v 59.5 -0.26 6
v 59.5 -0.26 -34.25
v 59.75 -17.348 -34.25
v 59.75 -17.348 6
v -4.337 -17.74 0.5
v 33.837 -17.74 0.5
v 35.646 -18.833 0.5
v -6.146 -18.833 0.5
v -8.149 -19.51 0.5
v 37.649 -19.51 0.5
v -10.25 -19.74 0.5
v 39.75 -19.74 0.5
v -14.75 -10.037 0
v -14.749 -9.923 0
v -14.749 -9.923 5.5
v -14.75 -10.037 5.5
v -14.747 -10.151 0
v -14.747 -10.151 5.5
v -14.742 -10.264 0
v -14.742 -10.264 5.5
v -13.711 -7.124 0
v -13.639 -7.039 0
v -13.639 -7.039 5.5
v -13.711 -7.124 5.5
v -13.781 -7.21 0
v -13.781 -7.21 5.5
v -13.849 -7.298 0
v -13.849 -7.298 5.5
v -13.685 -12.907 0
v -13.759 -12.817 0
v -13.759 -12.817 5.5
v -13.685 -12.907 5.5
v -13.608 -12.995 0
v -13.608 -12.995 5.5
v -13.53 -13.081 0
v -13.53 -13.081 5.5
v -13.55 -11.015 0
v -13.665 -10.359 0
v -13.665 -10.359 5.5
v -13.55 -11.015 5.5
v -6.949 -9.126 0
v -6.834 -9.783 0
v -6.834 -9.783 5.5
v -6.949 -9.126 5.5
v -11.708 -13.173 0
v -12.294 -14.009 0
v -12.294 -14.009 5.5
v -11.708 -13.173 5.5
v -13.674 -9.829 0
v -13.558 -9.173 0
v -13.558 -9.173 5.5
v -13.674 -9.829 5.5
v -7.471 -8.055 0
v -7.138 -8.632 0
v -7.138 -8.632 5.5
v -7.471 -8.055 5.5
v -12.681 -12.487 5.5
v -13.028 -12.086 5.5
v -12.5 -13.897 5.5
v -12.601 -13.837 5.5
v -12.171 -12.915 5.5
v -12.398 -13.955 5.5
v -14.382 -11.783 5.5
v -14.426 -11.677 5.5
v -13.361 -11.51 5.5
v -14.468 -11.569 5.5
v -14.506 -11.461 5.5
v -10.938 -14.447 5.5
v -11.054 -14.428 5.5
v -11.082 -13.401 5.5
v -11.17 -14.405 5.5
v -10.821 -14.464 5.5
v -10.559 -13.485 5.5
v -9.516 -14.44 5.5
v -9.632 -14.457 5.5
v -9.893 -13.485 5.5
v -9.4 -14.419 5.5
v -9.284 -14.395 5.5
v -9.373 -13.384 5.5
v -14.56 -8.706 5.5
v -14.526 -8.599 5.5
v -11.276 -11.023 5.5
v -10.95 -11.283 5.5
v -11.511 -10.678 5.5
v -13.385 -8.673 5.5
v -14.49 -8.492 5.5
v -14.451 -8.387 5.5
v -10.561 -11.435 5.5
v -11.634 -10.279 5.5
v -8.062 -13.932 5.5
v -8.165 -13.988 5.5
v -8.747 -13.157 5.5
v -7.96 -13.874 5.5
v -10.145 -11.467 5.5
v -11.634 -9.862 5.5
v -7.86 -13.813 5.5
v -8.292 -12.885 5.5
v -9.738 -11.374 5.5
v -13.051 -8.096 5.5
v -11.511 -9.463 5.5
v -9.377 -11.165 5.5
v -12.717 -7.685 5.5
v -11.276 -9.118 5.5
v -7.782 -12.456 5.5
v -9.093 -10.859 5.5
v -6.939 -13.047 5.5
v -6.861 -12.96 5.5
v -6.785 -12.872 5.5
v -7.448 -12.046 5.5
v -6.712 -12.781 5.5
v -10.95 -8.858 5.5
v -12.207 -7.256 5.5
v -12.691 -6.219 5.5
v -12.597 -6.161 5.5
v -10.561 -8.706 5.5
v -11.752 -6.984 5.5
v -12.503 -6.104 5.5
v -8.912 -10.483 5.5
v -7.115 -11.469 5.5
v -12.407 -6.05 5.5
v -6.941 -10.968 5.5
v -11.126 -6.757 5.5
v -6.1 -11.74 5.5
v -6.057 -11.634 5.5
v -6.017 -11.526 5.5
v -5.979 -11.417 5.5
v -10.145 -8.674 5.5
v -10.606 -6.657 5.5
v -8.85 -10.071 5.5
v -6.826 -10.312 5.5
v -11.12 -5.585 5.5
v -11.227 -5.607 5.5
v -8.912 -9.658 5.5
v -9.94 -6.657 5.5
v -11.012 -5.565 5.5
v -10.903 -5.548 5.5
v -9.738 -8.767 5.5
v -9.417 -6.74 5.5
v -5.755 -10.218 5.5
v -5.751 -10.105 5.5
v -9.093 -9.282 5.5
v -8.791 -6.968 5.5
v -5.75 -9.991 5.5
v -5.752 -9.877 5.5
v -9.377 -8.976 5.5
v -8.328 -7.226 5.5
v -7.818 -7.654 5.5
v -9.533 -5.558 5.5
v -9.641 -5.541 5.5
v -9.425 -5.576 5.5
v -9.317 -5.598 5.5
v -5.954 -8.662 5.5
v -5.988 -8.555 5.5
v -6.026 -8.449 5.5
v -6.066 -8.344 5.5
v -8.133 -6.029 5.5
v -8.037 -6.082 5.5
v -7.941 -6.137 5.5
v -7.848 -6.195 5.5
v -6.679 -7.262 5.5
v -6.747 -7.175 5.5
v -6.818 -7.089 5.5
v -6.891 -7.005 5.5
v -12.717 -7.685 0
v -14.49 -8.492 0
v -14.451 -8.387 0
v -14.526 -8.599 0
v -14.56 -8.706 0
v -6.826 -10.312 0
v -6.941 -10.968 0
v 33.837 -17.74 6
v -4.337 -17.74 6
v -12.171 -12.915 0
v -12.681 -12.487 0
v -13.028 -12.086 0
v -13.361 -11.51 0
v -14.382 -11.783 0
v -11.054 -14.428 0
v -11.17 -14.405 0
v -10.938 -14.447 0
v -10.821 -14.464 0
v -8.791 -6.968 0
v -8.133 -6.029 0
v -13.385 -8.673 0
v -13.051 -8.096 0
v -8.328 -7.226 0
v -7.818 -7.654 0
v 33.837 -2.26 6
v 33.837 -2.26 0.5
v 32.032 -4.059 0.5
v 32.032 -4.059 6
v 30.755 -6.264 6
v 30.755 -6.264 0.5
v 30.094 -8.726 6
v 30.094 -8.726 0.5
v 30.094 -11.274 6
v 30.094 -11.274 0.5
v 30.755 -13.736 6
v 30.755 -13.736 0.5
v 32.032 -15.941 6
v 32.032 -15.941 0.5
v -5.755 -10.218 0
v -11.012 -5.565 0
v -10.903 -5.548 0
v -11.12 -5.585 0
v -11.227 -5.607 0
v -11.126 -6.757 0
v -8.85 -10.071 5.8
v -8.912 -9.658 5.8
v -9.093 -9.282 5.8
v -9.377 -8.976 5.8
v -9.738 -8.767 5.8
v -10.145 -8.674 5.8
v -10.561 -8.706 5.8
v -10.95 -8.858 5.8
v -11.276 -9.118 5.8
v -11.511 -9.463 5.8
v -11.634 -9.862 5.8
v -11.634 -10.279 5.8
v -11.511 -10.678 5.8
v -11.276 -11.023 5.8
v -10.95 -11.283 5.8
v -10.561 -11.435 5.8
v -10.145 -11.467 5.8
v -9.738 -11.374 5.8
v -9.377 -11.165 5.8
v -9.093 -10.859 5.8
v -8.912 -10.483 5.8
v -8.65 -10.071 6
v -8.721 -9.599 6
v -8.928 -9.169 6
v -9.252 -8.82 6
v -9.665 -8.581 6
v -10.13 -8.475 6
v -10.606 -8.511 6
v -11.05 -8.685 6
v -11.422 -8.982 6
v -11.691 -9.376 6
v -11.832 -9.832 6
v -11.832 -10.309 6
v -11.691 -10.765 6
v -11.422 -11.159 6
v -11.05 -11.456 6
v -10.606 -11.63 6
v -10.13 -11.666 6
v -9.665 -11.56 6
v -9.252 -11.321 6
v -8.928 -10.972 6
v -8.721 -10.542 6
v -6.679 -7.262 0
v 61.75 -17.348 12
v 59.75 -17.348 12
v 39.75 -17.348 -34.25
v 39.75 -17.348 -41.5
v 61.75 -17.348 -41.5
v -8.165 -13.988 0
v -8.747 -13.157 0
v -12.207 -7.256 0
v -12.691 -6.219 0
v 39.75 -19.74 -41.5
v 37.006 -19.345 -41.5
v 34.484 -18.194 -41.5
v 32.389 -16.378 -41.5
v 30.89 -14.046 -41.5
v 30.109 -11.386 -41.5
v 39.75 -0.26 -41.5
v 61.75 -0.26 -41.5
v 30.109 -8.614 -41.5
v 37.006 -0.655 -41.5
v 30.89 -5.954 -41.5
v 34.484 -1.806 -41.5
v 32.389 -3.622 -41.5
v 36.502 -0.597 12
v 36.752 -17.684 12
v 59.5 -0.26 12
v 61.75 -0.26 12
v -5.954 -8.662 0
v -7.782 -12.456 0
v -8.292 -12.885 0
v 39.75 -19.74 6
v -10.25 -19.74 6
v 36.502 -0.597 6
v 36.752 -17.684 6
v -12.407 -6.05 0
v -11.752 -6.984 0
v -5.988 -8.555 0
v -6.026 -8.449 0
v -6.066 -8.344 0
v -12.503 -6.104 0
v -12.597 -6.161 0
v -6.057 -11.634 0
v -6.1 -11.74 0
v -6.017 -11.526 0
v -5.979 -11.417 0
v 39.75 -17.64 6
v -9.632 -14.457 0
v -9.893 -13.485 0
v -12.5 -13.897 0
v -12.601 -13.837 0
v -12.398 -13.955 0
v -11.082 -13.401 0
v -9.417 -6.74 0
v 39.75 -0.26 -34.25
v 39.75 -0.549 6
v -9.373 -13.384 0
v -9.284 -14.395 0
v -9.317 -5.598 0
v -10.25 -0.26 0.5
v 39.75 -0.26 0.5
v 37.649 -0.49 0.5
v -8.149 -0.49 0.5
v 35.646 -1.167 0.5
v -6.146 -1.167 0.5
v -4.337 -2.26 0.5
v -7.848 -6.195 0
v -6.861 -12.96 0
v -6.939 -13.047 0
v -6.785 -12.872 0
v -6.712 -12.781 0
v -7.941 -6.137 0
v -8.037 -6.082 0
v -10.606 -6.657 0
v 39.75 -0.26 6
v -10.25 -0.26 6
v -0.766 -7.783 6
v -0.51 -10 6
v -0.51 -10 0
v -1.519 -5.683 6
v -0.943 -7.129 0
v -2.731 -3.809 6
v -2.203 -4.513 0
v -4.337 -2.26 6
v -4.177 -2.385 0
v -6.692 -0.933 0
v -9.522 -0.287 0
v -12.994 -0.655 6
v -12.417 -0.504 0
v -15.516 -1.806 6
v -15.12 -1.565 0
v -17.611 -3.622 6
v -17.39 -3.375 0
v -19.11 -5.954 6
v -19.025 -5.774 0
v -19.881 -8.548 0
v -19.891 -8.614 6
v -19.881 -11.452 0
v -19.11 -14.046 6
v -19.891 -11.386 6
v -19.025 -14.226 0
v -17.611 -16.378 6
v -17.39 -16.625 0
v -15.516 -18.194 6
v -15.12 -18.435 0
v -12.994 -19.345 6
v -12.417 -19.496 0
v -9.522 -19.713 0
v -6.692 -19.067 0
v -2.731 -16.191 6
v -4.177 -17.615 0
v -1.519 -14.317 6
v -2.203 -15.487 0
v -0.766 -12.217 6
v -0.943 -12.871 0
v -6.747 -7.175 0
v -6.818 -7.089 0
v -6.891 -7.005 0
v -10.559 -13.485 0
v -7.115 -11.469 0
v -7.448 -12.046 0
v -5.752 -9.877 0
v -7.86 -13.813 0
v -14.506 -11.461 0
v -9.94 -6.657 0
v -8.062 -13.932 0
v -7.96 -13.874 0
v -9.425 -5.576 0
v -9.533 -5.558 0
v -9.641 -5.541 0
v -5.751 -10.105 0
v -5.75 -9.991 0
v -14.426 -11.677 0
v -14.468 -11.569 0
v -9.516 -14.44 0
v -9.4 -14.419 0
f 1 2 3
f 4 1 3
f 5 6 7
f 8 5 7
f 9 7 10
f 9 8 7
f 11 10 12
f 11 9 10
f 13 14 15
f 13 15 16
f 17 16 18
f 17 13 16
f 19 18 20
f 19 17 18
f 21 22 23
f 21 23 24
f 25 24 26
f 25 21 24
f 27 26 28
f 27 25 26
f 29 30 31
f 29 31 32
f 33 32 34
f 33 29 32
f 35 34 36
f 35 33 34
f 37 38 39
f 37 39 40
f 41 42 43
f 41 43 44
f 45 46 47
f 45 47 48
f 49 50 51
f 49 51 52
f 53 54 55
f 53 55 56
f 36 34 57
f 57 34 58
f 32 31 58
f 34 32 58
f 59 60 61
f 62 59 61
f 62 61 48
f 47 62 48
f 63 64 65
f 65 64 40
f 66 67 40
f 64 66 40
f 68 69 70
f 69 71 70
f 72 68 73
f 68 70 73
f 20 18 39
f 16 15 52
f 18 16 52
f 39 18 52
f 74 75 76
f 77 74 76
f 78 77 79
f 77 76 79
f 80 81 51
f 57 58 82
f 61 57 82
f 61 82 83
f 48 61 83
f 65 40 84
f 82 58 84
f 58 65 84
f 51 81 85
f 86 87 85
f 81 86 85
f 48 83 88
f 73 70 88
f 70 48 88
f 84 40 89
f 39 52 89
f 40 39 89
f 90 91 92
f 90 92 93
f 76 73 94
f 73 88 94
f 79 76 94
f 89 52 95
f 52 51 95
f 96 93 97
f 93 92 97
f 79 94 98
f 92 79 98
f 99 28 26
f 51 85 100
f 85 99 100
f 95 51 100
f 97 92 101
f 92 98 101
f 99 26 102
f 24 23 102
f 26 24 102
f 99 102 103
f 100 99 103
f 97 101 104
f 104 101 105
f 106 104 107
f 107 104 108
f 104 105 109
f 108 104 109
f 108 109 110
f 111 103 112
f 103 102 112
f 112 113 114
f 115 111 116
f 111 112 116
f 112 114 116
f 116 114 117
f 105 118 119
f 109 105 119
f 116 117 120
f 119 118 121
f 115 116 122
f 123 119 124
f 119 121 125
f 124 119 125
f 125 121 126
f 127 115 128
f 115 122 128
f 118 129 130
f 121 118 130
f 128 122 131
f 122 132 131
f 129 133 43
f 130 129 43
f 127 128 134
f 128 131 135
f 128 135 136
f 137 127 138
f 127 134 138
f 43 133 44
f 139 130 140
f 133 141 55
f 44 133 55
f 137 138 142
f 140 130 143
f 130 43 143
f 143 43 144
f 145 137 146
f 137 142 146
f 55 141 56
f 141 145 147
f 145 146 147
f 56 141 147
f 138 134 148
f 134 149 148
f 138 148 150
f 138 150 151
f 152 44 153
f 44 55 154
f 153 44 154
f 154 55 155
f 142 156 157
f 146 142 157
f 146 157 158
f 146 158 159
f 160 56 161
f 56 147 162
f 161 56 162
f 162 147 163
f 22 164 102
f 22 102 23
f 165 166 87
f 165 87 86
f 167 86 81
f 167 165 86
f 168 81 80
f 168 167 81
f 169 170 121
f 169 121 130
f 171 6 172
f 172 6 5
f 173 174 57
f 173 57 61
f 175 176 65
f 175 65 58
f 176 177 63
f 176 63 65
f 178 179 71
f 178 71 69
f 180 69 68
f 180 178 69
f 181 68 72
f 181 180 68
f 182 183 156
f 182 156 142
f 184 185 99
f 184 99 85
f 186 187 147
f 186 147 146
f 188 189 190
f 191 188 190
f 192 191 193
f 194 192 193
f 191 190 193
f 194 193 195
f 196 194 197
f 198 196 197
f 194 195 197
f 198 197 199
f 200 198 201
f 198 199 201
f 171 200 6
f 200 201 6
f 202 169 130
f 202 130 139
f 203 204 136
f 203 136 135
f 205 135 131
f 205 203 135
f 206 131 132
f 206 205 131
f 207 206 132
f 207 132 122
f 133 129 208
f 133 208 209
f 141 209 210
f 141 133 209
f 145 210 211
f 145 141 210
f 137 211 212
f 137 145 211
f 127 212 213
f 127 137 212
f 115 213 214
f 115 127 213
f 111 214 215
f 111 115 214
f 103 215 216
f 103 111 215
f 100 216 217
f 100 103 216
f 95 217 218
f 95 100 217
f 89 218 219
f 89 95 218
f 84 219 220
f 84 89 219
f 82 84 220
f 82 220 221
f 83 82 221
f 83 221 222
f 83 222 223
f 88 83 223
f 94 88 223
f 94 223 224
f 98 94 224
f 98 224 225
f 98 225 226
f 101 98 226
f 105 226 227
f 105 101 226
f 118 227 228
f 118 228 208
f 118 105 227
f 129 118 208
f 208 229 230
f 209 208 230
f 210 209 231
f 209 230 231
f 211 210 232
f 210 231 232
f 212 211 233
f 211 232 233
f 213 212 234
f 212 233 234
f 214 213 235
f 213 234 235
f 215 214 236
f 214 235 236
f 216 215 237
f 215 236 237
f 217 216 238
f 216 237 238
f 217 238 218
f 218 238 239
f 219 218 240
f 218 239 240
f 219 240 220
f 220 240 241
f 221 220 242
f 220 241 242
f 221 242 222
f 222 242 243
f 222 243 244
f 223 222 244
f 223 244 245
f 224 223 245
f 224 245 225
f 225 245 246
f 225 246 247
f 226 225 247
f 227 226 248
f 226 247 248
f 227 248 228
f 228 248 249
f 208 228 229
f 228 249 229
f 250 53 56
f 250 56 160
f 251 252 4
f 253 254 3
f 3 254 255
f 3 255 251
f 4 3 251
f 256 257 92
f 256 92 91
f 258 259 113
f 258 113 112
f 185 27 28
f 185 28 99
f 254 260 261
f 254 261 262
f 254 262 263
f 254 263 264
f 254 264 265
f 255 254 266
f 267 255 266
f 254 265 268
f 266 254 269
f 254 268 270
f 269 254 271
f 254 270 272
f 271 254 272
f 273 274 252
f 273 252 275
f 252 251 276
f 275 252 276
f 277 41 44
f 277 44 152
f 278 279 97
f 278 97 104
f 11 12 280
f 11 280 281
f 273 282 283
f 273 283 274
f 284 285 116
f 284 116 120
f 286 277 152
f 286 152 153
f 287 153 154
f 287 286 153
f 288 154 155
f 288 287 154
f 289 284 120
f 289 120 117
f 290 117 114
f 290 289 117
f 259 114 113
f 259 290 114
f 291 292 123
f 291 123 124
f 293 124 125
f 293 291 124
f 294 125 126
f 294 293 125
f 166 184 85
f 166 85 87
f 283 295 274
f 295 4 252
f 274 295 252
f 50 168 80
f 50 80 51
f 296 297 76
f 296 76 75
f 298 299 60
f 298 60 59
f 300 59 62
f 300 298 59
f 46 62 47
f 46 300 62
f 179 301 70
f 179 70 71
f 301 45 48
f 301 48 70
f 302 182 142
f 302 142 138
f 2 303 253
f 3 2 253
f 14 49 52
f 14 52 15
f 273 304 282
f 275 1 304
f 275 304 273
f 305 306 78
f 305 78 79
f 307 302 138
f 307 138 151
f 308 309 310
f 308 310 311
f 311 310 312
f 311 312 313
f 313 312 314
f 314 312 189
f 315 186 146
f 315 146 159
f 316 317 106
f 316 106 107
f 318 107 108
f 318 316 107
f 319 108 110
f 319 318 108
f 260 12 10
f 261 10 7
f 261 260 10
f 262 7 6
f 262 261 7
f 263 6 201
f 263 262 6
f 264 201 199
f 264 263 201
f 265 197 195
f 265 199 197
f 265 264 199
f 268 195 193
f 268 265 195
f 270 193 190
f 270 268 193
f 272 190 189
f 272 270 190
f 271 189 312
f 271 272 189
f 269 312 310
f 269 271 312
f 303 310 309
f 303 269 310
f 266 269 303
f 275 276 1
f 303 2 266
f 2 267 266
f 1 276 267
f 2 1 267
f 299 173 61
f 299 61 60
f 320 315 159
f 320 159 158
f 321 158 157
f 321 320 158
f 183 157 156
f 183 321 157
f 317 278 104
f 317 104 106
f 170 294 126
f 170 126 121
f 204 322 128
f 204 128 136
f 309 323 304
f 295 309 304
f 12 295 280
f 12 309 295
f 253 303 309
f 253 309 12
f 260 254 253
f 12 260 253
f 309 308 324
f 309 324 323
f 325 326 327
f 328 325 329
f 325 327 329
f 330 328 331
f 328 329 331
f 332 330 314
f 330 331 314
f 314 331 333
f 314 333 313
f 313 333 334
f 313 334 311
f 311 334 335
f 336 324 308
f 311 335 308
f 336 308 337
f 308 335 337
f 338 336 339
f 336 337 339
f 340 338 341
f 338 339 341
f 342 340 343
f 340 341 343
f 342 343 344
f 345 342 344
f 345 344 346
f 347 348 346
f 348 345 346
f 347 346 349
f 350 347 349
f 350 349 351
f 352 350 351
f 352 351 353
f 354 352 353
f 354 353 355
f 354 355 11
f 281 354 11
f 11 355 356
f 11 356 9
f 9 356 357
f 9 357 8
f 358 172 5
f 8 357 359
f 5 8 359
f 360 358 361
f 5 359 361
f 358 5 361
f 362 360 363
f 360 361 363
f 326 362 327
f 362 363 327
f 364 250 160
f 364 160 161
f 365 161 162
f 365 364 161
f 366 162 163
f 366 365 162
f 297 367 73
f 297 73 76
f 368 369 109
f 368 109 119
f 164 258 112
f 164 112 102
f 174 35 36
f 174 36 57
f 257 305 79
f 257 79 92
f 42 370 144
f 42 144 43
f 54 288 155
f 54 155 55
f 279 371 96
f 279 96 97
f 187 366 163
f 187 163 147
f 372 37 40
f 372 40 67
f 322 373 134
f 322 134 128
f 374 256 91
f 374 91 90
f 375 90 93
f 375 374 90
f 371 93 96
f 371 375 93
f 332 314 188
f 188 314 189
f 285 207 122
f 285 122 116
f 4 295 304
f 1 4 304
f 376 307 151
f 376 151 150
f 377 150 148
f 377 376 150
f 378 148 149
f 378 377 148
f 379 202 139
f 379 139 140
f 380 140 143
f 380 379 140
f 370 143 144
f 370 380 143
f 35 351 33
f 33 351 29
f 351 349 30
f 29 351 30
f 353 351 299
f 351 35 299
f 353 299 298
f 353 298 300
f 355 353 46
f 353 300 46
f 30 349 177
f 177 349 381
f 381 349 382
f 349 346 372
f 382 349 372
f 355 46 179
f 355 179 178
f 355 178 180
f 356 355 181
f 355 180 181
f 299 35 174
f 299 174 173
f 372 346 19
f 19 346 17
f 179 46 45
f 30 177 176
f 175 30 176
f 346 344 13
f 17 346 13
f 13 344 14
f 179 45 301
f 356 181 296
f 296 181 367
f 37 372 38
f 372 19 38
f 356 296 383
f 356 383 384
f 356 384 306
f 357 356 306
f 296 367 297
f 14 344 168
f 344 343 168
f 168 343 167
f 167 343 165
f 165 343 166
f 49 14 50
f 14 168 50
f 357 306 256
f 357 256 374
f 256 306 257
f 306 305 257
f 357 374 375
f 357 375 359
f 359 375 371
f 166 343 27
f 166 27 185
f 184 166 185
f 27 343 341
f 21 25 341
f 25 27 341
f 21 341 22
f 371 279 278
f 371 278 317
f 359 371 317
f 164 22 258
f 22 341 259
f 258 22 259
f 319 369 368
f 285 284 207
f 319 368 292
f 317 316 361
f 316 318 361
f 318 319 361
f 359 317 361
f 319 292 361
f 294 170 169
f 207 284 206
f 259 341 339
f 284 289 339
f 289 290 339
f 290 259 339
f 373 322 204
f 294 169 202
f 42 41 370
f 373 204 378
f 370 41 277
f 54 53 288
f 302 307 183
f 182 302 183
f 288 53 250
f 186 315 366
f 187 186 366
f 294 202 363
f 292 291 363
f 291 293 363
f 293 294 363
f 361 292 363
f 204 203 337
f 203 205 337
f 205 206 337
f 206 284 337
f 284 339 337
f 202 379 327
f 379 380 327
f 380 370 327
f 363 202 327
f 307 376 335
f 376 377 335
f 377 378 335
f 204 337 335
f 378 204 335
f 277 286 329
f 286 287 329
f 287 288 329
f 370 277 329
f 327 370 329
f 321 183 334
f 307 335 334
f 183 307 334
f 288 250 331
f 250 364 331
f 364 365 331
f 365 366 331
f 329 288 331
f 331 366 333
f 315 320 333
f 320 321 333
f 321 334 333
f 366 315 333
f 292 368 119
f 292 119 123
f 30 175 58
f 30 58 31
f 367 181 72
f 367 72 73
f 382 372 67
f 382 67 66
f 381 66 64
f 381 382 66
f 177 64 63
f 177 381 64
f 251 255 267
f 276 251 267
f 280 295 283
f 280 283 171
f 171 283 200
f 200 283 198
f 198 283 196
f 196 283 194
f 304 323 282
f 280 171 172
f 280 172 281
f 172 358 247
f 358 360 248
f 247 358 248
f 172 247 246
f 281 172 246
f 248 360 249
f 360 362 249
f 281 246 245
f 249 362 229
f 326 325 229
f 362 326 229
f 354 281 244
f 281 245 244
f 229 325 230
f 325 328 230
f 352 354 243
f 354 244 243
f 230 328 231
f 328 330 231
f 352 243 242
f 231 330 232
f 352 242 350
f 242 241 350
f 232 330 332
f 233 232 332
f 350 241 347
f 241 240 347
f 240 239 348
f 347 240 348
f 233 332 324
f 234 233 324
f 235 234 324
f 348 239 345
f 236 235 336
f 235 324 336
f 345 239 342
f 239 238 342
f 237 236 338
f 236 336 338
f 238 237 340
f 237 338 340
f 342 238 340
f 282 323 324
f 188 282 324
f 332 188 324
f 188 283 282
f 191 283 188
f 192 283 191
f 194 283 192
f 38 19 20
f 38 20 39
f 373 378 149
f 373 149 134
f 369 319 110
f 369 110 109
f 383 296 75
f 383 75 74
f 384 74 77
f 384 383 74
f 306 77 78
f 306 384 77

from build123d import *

# Parameters (mm, degrees)
ESQUISSE1_R        = 9.739786638
BOSS_EXTRU_1_DEPTH = 5.5
ESQUISSE2_R        = 9.739786638
ESQUISSE2_R_2      = 1.4
BOSS_EXTRU_2_DEPTH = 0.5
CHANFREIN1_SIZE    = 0.2
BOSS_EXTRU_3_START = -5.5
BOSS_EXTRU_3_DEPTH = 5.5
BOSS_EXTRU_4_START = 42
BOSS_EXTRU_4_DEPTH = 42
BOSS_EXTRU_5_DEPTH = 22
BOSS_EXTRU_6_DEPTH = 46.25
ESQUISSE7_W        = 6
ESQUISSE7_H        = 17.089185867
BOSS_EXTRU_7_DEPTH = 23


with BuildPart() as part:
    # Esquisse1 → Boss.-Extru.1 (new body)
    with BuildSketch(Plane.XY):
        with Locations((-10.25, -10)):
            Circle(ESQUISSE1_R)
        with BuildLine():
            Line((-5.751675839, -9.877200395), (-6.833750507, -9.782531128))
            Line((-6.833750507, -9.782531128), (-6.949445107, -9.126394451))
            Line((-6.949445107, -9.126394451), (-5.953521963, -8.661987862))
            ThreePointArc((-5.953521963, -8.661987862), (-6.006634107, -8.502052772), (-6.065697468, -8.344218516))
            Line((-6.065697468, -8.344218516), (-7.138261768, -8.631611254))
            Line((-7.138261768, -8.631611254), (-7.47139109, -8.054614344))
            Line((-7.47139109, -8.054614344), (-6.678798898, -7.262022153))
            ThreePointArc((-6.678798898, -7.262022153), (-6.782621037, -7.131675902), (-6.891198054, -7.005263035))
            Line((-6.891198054, -7.005263035), (-7.818046533, -7.654249327))
            Line((-7.818046533, -7.654249327), (-8.328430264, -7.225986526))
            Line((-8.328430264, -7.225986526), (-7.847635402, -6.194918616))
            ThreePointArc((-7.847635402, -6.194918616), (-7.988951343, -6.109285545), (-8.133315872, -6.028898352))
            Line((-8.133315872, -6.028898352), (-8.791112727, -6.968329619))
            Line((-8.791112727, -6.968329619), (-9.417191057, -6.740455742))
            Line((-9.417191057, -6.740455742), (-9.317216173, -5.597737589))
            ThreePointArc((-9.317216173, -5.597737589), (-9.478728542, -5.566588183), (-9.641271425, -5.541362369))
            Line((-9.641271425, -5.541362369), (-9.940094206, -6.656584169))
            Line((-9.940094206, -6.656584169), (-10.606352849, -6.656584169))
            Line((-10.606352849, -6.656584169), (-10.903477232, -5.547700874))
            ThreePointArc((-10.903477232, -5.547700874), (-11.065761738, -5.574558464), (-11.226956242, -5.607329229))
            Line((-11.226956242, -5.607329229), (-11.126406846, -6.756614081))
            Line((-11.126406846, -6.756614081), (-11.752485176, -6.984487958))
            Line((-11.752485176, -6.984487958), (-12.406540122, -6.050400691))
            ThreePointArc((-12.406540122, -6.050400691), (-12.550096477, -6.132241451), (-12.690551241, -6.219297732))
            Line((-12.690551241, -6.219297732), (-12.206963835, -7.256354271))
            Line((-12.206963835, -7.256354271), (-12.717347566, -7.684617071))
            Line((-12.717347566, -7.684617071), (-13.638885709, -7.039349117))
            ThreePointArc((-13.638885709, -7.039349117), (-13.74618945, -7.166864047), (-13.848697947, -7.298264801))
            Line((-13.848697947, -7.298264801), (-13.051434053, -8.095528695))
            Line((-13.051434053, -8.095528695), (-13.384563375, -8.672525605))
            Line((-13.384563375, -8.672525605), (-14.450903238, -8.3868007))
            ThreePointArc((-14.450903238, -8.3868007), (-14.508366703, -8.545244687), (-14.559856563, -8.705729393))
            Line((-14.559856563, -8.705729393), (-13.557961929, -9.172920534))
            Line((-13.557961929, -9.172920534), (-13.673656528, -9.829057211))
            Line((-13.673656528, -9.829057211), (-14.74934404, -9.923167674))
            ThreePointArc((-14.74934404, -9.923167674), (-14.749021481, -10.093838761), (-14.74222728, -10.264374865))
            Line((-14.74222728, -10.264374865), (-13.665452724, -10.358580432))
            Line((-13.665452724, -10.358580432), (-13.549758125, -11.014717109))
            Line((-13.549758125, -11.014717109), (-14.506309194, -11.460764198))
            ThreePointArc((-14.506309194, -11.460764198), (-14.447094307, -11.623083293), (-14.381691786, -11.78300953))
            Line((-14.381691786, -11.78300953), (-13.360941463, -11.509500306))
            Line((-13.360941463, -11.509500306), (-13.027812142, -12.086497216))
            Line((-13.027812142, -12.086497216), (-13.758807936, -12.817493011))
            ThreePointArc((-13.758807936, -12.817493011), (-13.646852578, -12.951506829), (-13.529782028, -13.081076086))
            Line((-13.529782028, -13.081076086), (-12.681156698, -12.486862233))
            Line((-12.681156698, -12.486862233), (-12.170772967, -12.915125033))
            Line((-12.170772967, -12.915125033), (-12.600738895, -13.837189942))
            ThreePointArc((-12.600738895, -13.837189942), (-12.448909121, -13.926168447), (-12.293716433, -14.009142444))
            Line((-12.293716433, -14.009142444), (-11.708090504, -13.172781941))
            Line((-11.708090504, -13.172781941), (-11.082012174, -13.400655818))
            Line((-11.082012174, -13.400655818), (-11.169878896, -14.404977051))
            ThreePointArc((-11.169878896, -14.404977051), (-10.996236031, -14.437694422), (-10.821442589, -14.463569577))
            Line((-10.821442589, -14.463569577), (-10.559109026, -13.48452739))
            Line((-10.559109026, -13.48452739), (-9.892850383, -13.48452739))
            Line((-9.892850383, -13.48452739), (-9.632173683, -14.457386077))
            ThreePointArc((-9.632173683, -14.457386077), (-9.45766281, -14.42969545), (-9.284373537, -14.395175256))
            Line((-9.284373537, -14.395175256), (-9.372796385, -13.384497479))
            Line((-9.372796385, -13.384497479), (-8.746718055, -13.156623602))
            Line((-8.746718055, -13.156623602), (-8.164782025, -13.987714383))
            ThreePointArc((-8.164782025, -13.987714383), (-8.010469052, -13.903139907), (-7.859580663, -13.812596936))
            Line((-7.859580663, -13.812596936), (-8.292239396, -12.884757289))
            Line((-8.292239396, -12.884757289), (-7.781855665, -12.456494489))
            Line((-7.781855665, -12.456494489), (-6.938532496, -13.046995729))
            ThreePointArc((-6.938532496, -13.046995729), (-6.822819391, -12.916236114), (-6.712266113, -12.78108593))
            Line((-6.712266113, -12.78108593), (-7.447769178, -12.045582865))
            Line((-7.447769178, -12.045582865), (-7.114639857, -11.468585954))
            Line((-7.114639857, -11.468585954), (-6.100183444, -11.740408731))
            ThreePointArc((-6.100183444, -11.740408731), (-6.036436962, -11.579837499), (-5.978900904, -11.416937723))
            Line((-5.978900904, -11.416937723), (-6.941241303, -10.968191026))
            Line((-6.941241303, -10.968191026), (-6.825546704, -10.312054348))
            Line((-6.825546704, -10.312054348), (-5.755303948, -10.21842024))
            ThreePointArc((-5.755303948, -10.21842024), (-5.750254354, -10.04784472), (-5.751675839, -9.877200395))
        make_face(mode=Mode.SUBTRACT)
    extrude(amount=BOSS_EXTRU_1_DEPTH)

    # Esquisse2 → Boss.-Extru.2 (add)
    with BuildSketch(Plane.XY.offset(5.5)):
        with Locations((-10.25, -10)):
            Circle(ESQUISSE2_R)
        with Locations((-10.249601616, -10.07055578)):
            Circle(ESQUISSE2_R_2, mode=Mode.SUBTRACT)
    extrude(amount=BOSS_EXTRU_2_DEPTH)

    # Chanfrein1
    chanfrein1_edges = [part.edges().sort_by_distance(p)[0] for p in [
        (-11.649601616, -10.07055578, 6),
    ]]
    chamfer(chanfrein1_edges, length=CHANFREIN1_SIZE)

    # Esquisse3 → Boss.-Extru.3 (add)
    with BuildSketch(Plane.XY.offset(6).offset(BOSS_EXTRU_3_START)):
        with BuildLine():
            Line((-10.25, -0.260213362), (39.75, -0.260213362))
            Line((39.75, -0.260213362), (39.75, -19.739786638))
            Line((39.75, -19.739786638), (-10.25, -19.739786638))
            ThreePointArc((-10.25, -19.739786638), (-19.989786638, -10), (-10.25, -0.260213362))
        make_face()
        with BuildLine():
            Line((33.837373972, -17.739786638), (-10.25, -17.739786638))
            ThreePointArc((-10.25, -17.739786638), (-17.989786638, -10), (-10.25, -2.260213362))
            Line((-10.25, -2.260213362), (33.837373972, -2.260213362))
            ThreePointArc((33.837373972, -2.260213362), (30.010213362, -10), (33.837373972, -17.739786638))
        make_face(mode=Mode.SUBTRACT)
    extrude(amount=BOSS_EXTRU_3_DEPTH)

    # Esquisse4 → Boss.-Extru.4 (add)
    with BuildSketch(Plane(origin=(0, 0, 0.5), x_dir=(-1, 0, 0), z_dir=(0, 0, -1)).offset(BOSS_EXTRU_4_START)):
        with BuildLine():
            Line((-39.75, -0.260213362), (-39.75, -19.739786638))
            ThreePointArc((-39.75, -19.739786638), (-30.010213362, -10), (-39.75, -0.260213362))
        make_face()
    extrude(amount=-BOSS_EXTRU_4_DEPTH)

    # Esquisse5 → Boss.-Extru.5 (add)
    with BuildSketch(Plane(origin=(39.75, 0, 0), x_dir=(0, 0, -1), z_dir=(1, 0, 0))):
        Polygon((34.25, -0.260213362), (34.25, -17.347570489), (39.5, -17.347570489), (41.5, -17.347570489), (41.5, -0.260213362), align=None)
    extrude(amount=BOSS_EXTRU_5_DEPTH)

    # Esquisse6 → Boss.-Extru.6 (add)
    with BuildSketch(Plane.XY.offset(-34.25)):
        Polygon((61.75, -0.260213362), (59.5, -0.260213362), (59.75, -17.347570489), (61.75, -17.347570489), align=None)
    extrude(amount=BOSS_EXTRU_6_DEPTH)

    # Esquisse7 → Boss.-Extru.7 (add)
    with BuildSketch(Plane(origin=(59.483460022, 0.870284673, 0), x_dir=(0, 0, 1), z_dir=(-0.9998929884849062, -0.014629134585590956, 0))):
        with Locations((9, -9.675211958)):
            Rectangle(ESQUISSE7_W, ESQUISSE7_H)
    extrude(amount=BOSS_EXTRU_7_DEPTH)


solid = part.part
